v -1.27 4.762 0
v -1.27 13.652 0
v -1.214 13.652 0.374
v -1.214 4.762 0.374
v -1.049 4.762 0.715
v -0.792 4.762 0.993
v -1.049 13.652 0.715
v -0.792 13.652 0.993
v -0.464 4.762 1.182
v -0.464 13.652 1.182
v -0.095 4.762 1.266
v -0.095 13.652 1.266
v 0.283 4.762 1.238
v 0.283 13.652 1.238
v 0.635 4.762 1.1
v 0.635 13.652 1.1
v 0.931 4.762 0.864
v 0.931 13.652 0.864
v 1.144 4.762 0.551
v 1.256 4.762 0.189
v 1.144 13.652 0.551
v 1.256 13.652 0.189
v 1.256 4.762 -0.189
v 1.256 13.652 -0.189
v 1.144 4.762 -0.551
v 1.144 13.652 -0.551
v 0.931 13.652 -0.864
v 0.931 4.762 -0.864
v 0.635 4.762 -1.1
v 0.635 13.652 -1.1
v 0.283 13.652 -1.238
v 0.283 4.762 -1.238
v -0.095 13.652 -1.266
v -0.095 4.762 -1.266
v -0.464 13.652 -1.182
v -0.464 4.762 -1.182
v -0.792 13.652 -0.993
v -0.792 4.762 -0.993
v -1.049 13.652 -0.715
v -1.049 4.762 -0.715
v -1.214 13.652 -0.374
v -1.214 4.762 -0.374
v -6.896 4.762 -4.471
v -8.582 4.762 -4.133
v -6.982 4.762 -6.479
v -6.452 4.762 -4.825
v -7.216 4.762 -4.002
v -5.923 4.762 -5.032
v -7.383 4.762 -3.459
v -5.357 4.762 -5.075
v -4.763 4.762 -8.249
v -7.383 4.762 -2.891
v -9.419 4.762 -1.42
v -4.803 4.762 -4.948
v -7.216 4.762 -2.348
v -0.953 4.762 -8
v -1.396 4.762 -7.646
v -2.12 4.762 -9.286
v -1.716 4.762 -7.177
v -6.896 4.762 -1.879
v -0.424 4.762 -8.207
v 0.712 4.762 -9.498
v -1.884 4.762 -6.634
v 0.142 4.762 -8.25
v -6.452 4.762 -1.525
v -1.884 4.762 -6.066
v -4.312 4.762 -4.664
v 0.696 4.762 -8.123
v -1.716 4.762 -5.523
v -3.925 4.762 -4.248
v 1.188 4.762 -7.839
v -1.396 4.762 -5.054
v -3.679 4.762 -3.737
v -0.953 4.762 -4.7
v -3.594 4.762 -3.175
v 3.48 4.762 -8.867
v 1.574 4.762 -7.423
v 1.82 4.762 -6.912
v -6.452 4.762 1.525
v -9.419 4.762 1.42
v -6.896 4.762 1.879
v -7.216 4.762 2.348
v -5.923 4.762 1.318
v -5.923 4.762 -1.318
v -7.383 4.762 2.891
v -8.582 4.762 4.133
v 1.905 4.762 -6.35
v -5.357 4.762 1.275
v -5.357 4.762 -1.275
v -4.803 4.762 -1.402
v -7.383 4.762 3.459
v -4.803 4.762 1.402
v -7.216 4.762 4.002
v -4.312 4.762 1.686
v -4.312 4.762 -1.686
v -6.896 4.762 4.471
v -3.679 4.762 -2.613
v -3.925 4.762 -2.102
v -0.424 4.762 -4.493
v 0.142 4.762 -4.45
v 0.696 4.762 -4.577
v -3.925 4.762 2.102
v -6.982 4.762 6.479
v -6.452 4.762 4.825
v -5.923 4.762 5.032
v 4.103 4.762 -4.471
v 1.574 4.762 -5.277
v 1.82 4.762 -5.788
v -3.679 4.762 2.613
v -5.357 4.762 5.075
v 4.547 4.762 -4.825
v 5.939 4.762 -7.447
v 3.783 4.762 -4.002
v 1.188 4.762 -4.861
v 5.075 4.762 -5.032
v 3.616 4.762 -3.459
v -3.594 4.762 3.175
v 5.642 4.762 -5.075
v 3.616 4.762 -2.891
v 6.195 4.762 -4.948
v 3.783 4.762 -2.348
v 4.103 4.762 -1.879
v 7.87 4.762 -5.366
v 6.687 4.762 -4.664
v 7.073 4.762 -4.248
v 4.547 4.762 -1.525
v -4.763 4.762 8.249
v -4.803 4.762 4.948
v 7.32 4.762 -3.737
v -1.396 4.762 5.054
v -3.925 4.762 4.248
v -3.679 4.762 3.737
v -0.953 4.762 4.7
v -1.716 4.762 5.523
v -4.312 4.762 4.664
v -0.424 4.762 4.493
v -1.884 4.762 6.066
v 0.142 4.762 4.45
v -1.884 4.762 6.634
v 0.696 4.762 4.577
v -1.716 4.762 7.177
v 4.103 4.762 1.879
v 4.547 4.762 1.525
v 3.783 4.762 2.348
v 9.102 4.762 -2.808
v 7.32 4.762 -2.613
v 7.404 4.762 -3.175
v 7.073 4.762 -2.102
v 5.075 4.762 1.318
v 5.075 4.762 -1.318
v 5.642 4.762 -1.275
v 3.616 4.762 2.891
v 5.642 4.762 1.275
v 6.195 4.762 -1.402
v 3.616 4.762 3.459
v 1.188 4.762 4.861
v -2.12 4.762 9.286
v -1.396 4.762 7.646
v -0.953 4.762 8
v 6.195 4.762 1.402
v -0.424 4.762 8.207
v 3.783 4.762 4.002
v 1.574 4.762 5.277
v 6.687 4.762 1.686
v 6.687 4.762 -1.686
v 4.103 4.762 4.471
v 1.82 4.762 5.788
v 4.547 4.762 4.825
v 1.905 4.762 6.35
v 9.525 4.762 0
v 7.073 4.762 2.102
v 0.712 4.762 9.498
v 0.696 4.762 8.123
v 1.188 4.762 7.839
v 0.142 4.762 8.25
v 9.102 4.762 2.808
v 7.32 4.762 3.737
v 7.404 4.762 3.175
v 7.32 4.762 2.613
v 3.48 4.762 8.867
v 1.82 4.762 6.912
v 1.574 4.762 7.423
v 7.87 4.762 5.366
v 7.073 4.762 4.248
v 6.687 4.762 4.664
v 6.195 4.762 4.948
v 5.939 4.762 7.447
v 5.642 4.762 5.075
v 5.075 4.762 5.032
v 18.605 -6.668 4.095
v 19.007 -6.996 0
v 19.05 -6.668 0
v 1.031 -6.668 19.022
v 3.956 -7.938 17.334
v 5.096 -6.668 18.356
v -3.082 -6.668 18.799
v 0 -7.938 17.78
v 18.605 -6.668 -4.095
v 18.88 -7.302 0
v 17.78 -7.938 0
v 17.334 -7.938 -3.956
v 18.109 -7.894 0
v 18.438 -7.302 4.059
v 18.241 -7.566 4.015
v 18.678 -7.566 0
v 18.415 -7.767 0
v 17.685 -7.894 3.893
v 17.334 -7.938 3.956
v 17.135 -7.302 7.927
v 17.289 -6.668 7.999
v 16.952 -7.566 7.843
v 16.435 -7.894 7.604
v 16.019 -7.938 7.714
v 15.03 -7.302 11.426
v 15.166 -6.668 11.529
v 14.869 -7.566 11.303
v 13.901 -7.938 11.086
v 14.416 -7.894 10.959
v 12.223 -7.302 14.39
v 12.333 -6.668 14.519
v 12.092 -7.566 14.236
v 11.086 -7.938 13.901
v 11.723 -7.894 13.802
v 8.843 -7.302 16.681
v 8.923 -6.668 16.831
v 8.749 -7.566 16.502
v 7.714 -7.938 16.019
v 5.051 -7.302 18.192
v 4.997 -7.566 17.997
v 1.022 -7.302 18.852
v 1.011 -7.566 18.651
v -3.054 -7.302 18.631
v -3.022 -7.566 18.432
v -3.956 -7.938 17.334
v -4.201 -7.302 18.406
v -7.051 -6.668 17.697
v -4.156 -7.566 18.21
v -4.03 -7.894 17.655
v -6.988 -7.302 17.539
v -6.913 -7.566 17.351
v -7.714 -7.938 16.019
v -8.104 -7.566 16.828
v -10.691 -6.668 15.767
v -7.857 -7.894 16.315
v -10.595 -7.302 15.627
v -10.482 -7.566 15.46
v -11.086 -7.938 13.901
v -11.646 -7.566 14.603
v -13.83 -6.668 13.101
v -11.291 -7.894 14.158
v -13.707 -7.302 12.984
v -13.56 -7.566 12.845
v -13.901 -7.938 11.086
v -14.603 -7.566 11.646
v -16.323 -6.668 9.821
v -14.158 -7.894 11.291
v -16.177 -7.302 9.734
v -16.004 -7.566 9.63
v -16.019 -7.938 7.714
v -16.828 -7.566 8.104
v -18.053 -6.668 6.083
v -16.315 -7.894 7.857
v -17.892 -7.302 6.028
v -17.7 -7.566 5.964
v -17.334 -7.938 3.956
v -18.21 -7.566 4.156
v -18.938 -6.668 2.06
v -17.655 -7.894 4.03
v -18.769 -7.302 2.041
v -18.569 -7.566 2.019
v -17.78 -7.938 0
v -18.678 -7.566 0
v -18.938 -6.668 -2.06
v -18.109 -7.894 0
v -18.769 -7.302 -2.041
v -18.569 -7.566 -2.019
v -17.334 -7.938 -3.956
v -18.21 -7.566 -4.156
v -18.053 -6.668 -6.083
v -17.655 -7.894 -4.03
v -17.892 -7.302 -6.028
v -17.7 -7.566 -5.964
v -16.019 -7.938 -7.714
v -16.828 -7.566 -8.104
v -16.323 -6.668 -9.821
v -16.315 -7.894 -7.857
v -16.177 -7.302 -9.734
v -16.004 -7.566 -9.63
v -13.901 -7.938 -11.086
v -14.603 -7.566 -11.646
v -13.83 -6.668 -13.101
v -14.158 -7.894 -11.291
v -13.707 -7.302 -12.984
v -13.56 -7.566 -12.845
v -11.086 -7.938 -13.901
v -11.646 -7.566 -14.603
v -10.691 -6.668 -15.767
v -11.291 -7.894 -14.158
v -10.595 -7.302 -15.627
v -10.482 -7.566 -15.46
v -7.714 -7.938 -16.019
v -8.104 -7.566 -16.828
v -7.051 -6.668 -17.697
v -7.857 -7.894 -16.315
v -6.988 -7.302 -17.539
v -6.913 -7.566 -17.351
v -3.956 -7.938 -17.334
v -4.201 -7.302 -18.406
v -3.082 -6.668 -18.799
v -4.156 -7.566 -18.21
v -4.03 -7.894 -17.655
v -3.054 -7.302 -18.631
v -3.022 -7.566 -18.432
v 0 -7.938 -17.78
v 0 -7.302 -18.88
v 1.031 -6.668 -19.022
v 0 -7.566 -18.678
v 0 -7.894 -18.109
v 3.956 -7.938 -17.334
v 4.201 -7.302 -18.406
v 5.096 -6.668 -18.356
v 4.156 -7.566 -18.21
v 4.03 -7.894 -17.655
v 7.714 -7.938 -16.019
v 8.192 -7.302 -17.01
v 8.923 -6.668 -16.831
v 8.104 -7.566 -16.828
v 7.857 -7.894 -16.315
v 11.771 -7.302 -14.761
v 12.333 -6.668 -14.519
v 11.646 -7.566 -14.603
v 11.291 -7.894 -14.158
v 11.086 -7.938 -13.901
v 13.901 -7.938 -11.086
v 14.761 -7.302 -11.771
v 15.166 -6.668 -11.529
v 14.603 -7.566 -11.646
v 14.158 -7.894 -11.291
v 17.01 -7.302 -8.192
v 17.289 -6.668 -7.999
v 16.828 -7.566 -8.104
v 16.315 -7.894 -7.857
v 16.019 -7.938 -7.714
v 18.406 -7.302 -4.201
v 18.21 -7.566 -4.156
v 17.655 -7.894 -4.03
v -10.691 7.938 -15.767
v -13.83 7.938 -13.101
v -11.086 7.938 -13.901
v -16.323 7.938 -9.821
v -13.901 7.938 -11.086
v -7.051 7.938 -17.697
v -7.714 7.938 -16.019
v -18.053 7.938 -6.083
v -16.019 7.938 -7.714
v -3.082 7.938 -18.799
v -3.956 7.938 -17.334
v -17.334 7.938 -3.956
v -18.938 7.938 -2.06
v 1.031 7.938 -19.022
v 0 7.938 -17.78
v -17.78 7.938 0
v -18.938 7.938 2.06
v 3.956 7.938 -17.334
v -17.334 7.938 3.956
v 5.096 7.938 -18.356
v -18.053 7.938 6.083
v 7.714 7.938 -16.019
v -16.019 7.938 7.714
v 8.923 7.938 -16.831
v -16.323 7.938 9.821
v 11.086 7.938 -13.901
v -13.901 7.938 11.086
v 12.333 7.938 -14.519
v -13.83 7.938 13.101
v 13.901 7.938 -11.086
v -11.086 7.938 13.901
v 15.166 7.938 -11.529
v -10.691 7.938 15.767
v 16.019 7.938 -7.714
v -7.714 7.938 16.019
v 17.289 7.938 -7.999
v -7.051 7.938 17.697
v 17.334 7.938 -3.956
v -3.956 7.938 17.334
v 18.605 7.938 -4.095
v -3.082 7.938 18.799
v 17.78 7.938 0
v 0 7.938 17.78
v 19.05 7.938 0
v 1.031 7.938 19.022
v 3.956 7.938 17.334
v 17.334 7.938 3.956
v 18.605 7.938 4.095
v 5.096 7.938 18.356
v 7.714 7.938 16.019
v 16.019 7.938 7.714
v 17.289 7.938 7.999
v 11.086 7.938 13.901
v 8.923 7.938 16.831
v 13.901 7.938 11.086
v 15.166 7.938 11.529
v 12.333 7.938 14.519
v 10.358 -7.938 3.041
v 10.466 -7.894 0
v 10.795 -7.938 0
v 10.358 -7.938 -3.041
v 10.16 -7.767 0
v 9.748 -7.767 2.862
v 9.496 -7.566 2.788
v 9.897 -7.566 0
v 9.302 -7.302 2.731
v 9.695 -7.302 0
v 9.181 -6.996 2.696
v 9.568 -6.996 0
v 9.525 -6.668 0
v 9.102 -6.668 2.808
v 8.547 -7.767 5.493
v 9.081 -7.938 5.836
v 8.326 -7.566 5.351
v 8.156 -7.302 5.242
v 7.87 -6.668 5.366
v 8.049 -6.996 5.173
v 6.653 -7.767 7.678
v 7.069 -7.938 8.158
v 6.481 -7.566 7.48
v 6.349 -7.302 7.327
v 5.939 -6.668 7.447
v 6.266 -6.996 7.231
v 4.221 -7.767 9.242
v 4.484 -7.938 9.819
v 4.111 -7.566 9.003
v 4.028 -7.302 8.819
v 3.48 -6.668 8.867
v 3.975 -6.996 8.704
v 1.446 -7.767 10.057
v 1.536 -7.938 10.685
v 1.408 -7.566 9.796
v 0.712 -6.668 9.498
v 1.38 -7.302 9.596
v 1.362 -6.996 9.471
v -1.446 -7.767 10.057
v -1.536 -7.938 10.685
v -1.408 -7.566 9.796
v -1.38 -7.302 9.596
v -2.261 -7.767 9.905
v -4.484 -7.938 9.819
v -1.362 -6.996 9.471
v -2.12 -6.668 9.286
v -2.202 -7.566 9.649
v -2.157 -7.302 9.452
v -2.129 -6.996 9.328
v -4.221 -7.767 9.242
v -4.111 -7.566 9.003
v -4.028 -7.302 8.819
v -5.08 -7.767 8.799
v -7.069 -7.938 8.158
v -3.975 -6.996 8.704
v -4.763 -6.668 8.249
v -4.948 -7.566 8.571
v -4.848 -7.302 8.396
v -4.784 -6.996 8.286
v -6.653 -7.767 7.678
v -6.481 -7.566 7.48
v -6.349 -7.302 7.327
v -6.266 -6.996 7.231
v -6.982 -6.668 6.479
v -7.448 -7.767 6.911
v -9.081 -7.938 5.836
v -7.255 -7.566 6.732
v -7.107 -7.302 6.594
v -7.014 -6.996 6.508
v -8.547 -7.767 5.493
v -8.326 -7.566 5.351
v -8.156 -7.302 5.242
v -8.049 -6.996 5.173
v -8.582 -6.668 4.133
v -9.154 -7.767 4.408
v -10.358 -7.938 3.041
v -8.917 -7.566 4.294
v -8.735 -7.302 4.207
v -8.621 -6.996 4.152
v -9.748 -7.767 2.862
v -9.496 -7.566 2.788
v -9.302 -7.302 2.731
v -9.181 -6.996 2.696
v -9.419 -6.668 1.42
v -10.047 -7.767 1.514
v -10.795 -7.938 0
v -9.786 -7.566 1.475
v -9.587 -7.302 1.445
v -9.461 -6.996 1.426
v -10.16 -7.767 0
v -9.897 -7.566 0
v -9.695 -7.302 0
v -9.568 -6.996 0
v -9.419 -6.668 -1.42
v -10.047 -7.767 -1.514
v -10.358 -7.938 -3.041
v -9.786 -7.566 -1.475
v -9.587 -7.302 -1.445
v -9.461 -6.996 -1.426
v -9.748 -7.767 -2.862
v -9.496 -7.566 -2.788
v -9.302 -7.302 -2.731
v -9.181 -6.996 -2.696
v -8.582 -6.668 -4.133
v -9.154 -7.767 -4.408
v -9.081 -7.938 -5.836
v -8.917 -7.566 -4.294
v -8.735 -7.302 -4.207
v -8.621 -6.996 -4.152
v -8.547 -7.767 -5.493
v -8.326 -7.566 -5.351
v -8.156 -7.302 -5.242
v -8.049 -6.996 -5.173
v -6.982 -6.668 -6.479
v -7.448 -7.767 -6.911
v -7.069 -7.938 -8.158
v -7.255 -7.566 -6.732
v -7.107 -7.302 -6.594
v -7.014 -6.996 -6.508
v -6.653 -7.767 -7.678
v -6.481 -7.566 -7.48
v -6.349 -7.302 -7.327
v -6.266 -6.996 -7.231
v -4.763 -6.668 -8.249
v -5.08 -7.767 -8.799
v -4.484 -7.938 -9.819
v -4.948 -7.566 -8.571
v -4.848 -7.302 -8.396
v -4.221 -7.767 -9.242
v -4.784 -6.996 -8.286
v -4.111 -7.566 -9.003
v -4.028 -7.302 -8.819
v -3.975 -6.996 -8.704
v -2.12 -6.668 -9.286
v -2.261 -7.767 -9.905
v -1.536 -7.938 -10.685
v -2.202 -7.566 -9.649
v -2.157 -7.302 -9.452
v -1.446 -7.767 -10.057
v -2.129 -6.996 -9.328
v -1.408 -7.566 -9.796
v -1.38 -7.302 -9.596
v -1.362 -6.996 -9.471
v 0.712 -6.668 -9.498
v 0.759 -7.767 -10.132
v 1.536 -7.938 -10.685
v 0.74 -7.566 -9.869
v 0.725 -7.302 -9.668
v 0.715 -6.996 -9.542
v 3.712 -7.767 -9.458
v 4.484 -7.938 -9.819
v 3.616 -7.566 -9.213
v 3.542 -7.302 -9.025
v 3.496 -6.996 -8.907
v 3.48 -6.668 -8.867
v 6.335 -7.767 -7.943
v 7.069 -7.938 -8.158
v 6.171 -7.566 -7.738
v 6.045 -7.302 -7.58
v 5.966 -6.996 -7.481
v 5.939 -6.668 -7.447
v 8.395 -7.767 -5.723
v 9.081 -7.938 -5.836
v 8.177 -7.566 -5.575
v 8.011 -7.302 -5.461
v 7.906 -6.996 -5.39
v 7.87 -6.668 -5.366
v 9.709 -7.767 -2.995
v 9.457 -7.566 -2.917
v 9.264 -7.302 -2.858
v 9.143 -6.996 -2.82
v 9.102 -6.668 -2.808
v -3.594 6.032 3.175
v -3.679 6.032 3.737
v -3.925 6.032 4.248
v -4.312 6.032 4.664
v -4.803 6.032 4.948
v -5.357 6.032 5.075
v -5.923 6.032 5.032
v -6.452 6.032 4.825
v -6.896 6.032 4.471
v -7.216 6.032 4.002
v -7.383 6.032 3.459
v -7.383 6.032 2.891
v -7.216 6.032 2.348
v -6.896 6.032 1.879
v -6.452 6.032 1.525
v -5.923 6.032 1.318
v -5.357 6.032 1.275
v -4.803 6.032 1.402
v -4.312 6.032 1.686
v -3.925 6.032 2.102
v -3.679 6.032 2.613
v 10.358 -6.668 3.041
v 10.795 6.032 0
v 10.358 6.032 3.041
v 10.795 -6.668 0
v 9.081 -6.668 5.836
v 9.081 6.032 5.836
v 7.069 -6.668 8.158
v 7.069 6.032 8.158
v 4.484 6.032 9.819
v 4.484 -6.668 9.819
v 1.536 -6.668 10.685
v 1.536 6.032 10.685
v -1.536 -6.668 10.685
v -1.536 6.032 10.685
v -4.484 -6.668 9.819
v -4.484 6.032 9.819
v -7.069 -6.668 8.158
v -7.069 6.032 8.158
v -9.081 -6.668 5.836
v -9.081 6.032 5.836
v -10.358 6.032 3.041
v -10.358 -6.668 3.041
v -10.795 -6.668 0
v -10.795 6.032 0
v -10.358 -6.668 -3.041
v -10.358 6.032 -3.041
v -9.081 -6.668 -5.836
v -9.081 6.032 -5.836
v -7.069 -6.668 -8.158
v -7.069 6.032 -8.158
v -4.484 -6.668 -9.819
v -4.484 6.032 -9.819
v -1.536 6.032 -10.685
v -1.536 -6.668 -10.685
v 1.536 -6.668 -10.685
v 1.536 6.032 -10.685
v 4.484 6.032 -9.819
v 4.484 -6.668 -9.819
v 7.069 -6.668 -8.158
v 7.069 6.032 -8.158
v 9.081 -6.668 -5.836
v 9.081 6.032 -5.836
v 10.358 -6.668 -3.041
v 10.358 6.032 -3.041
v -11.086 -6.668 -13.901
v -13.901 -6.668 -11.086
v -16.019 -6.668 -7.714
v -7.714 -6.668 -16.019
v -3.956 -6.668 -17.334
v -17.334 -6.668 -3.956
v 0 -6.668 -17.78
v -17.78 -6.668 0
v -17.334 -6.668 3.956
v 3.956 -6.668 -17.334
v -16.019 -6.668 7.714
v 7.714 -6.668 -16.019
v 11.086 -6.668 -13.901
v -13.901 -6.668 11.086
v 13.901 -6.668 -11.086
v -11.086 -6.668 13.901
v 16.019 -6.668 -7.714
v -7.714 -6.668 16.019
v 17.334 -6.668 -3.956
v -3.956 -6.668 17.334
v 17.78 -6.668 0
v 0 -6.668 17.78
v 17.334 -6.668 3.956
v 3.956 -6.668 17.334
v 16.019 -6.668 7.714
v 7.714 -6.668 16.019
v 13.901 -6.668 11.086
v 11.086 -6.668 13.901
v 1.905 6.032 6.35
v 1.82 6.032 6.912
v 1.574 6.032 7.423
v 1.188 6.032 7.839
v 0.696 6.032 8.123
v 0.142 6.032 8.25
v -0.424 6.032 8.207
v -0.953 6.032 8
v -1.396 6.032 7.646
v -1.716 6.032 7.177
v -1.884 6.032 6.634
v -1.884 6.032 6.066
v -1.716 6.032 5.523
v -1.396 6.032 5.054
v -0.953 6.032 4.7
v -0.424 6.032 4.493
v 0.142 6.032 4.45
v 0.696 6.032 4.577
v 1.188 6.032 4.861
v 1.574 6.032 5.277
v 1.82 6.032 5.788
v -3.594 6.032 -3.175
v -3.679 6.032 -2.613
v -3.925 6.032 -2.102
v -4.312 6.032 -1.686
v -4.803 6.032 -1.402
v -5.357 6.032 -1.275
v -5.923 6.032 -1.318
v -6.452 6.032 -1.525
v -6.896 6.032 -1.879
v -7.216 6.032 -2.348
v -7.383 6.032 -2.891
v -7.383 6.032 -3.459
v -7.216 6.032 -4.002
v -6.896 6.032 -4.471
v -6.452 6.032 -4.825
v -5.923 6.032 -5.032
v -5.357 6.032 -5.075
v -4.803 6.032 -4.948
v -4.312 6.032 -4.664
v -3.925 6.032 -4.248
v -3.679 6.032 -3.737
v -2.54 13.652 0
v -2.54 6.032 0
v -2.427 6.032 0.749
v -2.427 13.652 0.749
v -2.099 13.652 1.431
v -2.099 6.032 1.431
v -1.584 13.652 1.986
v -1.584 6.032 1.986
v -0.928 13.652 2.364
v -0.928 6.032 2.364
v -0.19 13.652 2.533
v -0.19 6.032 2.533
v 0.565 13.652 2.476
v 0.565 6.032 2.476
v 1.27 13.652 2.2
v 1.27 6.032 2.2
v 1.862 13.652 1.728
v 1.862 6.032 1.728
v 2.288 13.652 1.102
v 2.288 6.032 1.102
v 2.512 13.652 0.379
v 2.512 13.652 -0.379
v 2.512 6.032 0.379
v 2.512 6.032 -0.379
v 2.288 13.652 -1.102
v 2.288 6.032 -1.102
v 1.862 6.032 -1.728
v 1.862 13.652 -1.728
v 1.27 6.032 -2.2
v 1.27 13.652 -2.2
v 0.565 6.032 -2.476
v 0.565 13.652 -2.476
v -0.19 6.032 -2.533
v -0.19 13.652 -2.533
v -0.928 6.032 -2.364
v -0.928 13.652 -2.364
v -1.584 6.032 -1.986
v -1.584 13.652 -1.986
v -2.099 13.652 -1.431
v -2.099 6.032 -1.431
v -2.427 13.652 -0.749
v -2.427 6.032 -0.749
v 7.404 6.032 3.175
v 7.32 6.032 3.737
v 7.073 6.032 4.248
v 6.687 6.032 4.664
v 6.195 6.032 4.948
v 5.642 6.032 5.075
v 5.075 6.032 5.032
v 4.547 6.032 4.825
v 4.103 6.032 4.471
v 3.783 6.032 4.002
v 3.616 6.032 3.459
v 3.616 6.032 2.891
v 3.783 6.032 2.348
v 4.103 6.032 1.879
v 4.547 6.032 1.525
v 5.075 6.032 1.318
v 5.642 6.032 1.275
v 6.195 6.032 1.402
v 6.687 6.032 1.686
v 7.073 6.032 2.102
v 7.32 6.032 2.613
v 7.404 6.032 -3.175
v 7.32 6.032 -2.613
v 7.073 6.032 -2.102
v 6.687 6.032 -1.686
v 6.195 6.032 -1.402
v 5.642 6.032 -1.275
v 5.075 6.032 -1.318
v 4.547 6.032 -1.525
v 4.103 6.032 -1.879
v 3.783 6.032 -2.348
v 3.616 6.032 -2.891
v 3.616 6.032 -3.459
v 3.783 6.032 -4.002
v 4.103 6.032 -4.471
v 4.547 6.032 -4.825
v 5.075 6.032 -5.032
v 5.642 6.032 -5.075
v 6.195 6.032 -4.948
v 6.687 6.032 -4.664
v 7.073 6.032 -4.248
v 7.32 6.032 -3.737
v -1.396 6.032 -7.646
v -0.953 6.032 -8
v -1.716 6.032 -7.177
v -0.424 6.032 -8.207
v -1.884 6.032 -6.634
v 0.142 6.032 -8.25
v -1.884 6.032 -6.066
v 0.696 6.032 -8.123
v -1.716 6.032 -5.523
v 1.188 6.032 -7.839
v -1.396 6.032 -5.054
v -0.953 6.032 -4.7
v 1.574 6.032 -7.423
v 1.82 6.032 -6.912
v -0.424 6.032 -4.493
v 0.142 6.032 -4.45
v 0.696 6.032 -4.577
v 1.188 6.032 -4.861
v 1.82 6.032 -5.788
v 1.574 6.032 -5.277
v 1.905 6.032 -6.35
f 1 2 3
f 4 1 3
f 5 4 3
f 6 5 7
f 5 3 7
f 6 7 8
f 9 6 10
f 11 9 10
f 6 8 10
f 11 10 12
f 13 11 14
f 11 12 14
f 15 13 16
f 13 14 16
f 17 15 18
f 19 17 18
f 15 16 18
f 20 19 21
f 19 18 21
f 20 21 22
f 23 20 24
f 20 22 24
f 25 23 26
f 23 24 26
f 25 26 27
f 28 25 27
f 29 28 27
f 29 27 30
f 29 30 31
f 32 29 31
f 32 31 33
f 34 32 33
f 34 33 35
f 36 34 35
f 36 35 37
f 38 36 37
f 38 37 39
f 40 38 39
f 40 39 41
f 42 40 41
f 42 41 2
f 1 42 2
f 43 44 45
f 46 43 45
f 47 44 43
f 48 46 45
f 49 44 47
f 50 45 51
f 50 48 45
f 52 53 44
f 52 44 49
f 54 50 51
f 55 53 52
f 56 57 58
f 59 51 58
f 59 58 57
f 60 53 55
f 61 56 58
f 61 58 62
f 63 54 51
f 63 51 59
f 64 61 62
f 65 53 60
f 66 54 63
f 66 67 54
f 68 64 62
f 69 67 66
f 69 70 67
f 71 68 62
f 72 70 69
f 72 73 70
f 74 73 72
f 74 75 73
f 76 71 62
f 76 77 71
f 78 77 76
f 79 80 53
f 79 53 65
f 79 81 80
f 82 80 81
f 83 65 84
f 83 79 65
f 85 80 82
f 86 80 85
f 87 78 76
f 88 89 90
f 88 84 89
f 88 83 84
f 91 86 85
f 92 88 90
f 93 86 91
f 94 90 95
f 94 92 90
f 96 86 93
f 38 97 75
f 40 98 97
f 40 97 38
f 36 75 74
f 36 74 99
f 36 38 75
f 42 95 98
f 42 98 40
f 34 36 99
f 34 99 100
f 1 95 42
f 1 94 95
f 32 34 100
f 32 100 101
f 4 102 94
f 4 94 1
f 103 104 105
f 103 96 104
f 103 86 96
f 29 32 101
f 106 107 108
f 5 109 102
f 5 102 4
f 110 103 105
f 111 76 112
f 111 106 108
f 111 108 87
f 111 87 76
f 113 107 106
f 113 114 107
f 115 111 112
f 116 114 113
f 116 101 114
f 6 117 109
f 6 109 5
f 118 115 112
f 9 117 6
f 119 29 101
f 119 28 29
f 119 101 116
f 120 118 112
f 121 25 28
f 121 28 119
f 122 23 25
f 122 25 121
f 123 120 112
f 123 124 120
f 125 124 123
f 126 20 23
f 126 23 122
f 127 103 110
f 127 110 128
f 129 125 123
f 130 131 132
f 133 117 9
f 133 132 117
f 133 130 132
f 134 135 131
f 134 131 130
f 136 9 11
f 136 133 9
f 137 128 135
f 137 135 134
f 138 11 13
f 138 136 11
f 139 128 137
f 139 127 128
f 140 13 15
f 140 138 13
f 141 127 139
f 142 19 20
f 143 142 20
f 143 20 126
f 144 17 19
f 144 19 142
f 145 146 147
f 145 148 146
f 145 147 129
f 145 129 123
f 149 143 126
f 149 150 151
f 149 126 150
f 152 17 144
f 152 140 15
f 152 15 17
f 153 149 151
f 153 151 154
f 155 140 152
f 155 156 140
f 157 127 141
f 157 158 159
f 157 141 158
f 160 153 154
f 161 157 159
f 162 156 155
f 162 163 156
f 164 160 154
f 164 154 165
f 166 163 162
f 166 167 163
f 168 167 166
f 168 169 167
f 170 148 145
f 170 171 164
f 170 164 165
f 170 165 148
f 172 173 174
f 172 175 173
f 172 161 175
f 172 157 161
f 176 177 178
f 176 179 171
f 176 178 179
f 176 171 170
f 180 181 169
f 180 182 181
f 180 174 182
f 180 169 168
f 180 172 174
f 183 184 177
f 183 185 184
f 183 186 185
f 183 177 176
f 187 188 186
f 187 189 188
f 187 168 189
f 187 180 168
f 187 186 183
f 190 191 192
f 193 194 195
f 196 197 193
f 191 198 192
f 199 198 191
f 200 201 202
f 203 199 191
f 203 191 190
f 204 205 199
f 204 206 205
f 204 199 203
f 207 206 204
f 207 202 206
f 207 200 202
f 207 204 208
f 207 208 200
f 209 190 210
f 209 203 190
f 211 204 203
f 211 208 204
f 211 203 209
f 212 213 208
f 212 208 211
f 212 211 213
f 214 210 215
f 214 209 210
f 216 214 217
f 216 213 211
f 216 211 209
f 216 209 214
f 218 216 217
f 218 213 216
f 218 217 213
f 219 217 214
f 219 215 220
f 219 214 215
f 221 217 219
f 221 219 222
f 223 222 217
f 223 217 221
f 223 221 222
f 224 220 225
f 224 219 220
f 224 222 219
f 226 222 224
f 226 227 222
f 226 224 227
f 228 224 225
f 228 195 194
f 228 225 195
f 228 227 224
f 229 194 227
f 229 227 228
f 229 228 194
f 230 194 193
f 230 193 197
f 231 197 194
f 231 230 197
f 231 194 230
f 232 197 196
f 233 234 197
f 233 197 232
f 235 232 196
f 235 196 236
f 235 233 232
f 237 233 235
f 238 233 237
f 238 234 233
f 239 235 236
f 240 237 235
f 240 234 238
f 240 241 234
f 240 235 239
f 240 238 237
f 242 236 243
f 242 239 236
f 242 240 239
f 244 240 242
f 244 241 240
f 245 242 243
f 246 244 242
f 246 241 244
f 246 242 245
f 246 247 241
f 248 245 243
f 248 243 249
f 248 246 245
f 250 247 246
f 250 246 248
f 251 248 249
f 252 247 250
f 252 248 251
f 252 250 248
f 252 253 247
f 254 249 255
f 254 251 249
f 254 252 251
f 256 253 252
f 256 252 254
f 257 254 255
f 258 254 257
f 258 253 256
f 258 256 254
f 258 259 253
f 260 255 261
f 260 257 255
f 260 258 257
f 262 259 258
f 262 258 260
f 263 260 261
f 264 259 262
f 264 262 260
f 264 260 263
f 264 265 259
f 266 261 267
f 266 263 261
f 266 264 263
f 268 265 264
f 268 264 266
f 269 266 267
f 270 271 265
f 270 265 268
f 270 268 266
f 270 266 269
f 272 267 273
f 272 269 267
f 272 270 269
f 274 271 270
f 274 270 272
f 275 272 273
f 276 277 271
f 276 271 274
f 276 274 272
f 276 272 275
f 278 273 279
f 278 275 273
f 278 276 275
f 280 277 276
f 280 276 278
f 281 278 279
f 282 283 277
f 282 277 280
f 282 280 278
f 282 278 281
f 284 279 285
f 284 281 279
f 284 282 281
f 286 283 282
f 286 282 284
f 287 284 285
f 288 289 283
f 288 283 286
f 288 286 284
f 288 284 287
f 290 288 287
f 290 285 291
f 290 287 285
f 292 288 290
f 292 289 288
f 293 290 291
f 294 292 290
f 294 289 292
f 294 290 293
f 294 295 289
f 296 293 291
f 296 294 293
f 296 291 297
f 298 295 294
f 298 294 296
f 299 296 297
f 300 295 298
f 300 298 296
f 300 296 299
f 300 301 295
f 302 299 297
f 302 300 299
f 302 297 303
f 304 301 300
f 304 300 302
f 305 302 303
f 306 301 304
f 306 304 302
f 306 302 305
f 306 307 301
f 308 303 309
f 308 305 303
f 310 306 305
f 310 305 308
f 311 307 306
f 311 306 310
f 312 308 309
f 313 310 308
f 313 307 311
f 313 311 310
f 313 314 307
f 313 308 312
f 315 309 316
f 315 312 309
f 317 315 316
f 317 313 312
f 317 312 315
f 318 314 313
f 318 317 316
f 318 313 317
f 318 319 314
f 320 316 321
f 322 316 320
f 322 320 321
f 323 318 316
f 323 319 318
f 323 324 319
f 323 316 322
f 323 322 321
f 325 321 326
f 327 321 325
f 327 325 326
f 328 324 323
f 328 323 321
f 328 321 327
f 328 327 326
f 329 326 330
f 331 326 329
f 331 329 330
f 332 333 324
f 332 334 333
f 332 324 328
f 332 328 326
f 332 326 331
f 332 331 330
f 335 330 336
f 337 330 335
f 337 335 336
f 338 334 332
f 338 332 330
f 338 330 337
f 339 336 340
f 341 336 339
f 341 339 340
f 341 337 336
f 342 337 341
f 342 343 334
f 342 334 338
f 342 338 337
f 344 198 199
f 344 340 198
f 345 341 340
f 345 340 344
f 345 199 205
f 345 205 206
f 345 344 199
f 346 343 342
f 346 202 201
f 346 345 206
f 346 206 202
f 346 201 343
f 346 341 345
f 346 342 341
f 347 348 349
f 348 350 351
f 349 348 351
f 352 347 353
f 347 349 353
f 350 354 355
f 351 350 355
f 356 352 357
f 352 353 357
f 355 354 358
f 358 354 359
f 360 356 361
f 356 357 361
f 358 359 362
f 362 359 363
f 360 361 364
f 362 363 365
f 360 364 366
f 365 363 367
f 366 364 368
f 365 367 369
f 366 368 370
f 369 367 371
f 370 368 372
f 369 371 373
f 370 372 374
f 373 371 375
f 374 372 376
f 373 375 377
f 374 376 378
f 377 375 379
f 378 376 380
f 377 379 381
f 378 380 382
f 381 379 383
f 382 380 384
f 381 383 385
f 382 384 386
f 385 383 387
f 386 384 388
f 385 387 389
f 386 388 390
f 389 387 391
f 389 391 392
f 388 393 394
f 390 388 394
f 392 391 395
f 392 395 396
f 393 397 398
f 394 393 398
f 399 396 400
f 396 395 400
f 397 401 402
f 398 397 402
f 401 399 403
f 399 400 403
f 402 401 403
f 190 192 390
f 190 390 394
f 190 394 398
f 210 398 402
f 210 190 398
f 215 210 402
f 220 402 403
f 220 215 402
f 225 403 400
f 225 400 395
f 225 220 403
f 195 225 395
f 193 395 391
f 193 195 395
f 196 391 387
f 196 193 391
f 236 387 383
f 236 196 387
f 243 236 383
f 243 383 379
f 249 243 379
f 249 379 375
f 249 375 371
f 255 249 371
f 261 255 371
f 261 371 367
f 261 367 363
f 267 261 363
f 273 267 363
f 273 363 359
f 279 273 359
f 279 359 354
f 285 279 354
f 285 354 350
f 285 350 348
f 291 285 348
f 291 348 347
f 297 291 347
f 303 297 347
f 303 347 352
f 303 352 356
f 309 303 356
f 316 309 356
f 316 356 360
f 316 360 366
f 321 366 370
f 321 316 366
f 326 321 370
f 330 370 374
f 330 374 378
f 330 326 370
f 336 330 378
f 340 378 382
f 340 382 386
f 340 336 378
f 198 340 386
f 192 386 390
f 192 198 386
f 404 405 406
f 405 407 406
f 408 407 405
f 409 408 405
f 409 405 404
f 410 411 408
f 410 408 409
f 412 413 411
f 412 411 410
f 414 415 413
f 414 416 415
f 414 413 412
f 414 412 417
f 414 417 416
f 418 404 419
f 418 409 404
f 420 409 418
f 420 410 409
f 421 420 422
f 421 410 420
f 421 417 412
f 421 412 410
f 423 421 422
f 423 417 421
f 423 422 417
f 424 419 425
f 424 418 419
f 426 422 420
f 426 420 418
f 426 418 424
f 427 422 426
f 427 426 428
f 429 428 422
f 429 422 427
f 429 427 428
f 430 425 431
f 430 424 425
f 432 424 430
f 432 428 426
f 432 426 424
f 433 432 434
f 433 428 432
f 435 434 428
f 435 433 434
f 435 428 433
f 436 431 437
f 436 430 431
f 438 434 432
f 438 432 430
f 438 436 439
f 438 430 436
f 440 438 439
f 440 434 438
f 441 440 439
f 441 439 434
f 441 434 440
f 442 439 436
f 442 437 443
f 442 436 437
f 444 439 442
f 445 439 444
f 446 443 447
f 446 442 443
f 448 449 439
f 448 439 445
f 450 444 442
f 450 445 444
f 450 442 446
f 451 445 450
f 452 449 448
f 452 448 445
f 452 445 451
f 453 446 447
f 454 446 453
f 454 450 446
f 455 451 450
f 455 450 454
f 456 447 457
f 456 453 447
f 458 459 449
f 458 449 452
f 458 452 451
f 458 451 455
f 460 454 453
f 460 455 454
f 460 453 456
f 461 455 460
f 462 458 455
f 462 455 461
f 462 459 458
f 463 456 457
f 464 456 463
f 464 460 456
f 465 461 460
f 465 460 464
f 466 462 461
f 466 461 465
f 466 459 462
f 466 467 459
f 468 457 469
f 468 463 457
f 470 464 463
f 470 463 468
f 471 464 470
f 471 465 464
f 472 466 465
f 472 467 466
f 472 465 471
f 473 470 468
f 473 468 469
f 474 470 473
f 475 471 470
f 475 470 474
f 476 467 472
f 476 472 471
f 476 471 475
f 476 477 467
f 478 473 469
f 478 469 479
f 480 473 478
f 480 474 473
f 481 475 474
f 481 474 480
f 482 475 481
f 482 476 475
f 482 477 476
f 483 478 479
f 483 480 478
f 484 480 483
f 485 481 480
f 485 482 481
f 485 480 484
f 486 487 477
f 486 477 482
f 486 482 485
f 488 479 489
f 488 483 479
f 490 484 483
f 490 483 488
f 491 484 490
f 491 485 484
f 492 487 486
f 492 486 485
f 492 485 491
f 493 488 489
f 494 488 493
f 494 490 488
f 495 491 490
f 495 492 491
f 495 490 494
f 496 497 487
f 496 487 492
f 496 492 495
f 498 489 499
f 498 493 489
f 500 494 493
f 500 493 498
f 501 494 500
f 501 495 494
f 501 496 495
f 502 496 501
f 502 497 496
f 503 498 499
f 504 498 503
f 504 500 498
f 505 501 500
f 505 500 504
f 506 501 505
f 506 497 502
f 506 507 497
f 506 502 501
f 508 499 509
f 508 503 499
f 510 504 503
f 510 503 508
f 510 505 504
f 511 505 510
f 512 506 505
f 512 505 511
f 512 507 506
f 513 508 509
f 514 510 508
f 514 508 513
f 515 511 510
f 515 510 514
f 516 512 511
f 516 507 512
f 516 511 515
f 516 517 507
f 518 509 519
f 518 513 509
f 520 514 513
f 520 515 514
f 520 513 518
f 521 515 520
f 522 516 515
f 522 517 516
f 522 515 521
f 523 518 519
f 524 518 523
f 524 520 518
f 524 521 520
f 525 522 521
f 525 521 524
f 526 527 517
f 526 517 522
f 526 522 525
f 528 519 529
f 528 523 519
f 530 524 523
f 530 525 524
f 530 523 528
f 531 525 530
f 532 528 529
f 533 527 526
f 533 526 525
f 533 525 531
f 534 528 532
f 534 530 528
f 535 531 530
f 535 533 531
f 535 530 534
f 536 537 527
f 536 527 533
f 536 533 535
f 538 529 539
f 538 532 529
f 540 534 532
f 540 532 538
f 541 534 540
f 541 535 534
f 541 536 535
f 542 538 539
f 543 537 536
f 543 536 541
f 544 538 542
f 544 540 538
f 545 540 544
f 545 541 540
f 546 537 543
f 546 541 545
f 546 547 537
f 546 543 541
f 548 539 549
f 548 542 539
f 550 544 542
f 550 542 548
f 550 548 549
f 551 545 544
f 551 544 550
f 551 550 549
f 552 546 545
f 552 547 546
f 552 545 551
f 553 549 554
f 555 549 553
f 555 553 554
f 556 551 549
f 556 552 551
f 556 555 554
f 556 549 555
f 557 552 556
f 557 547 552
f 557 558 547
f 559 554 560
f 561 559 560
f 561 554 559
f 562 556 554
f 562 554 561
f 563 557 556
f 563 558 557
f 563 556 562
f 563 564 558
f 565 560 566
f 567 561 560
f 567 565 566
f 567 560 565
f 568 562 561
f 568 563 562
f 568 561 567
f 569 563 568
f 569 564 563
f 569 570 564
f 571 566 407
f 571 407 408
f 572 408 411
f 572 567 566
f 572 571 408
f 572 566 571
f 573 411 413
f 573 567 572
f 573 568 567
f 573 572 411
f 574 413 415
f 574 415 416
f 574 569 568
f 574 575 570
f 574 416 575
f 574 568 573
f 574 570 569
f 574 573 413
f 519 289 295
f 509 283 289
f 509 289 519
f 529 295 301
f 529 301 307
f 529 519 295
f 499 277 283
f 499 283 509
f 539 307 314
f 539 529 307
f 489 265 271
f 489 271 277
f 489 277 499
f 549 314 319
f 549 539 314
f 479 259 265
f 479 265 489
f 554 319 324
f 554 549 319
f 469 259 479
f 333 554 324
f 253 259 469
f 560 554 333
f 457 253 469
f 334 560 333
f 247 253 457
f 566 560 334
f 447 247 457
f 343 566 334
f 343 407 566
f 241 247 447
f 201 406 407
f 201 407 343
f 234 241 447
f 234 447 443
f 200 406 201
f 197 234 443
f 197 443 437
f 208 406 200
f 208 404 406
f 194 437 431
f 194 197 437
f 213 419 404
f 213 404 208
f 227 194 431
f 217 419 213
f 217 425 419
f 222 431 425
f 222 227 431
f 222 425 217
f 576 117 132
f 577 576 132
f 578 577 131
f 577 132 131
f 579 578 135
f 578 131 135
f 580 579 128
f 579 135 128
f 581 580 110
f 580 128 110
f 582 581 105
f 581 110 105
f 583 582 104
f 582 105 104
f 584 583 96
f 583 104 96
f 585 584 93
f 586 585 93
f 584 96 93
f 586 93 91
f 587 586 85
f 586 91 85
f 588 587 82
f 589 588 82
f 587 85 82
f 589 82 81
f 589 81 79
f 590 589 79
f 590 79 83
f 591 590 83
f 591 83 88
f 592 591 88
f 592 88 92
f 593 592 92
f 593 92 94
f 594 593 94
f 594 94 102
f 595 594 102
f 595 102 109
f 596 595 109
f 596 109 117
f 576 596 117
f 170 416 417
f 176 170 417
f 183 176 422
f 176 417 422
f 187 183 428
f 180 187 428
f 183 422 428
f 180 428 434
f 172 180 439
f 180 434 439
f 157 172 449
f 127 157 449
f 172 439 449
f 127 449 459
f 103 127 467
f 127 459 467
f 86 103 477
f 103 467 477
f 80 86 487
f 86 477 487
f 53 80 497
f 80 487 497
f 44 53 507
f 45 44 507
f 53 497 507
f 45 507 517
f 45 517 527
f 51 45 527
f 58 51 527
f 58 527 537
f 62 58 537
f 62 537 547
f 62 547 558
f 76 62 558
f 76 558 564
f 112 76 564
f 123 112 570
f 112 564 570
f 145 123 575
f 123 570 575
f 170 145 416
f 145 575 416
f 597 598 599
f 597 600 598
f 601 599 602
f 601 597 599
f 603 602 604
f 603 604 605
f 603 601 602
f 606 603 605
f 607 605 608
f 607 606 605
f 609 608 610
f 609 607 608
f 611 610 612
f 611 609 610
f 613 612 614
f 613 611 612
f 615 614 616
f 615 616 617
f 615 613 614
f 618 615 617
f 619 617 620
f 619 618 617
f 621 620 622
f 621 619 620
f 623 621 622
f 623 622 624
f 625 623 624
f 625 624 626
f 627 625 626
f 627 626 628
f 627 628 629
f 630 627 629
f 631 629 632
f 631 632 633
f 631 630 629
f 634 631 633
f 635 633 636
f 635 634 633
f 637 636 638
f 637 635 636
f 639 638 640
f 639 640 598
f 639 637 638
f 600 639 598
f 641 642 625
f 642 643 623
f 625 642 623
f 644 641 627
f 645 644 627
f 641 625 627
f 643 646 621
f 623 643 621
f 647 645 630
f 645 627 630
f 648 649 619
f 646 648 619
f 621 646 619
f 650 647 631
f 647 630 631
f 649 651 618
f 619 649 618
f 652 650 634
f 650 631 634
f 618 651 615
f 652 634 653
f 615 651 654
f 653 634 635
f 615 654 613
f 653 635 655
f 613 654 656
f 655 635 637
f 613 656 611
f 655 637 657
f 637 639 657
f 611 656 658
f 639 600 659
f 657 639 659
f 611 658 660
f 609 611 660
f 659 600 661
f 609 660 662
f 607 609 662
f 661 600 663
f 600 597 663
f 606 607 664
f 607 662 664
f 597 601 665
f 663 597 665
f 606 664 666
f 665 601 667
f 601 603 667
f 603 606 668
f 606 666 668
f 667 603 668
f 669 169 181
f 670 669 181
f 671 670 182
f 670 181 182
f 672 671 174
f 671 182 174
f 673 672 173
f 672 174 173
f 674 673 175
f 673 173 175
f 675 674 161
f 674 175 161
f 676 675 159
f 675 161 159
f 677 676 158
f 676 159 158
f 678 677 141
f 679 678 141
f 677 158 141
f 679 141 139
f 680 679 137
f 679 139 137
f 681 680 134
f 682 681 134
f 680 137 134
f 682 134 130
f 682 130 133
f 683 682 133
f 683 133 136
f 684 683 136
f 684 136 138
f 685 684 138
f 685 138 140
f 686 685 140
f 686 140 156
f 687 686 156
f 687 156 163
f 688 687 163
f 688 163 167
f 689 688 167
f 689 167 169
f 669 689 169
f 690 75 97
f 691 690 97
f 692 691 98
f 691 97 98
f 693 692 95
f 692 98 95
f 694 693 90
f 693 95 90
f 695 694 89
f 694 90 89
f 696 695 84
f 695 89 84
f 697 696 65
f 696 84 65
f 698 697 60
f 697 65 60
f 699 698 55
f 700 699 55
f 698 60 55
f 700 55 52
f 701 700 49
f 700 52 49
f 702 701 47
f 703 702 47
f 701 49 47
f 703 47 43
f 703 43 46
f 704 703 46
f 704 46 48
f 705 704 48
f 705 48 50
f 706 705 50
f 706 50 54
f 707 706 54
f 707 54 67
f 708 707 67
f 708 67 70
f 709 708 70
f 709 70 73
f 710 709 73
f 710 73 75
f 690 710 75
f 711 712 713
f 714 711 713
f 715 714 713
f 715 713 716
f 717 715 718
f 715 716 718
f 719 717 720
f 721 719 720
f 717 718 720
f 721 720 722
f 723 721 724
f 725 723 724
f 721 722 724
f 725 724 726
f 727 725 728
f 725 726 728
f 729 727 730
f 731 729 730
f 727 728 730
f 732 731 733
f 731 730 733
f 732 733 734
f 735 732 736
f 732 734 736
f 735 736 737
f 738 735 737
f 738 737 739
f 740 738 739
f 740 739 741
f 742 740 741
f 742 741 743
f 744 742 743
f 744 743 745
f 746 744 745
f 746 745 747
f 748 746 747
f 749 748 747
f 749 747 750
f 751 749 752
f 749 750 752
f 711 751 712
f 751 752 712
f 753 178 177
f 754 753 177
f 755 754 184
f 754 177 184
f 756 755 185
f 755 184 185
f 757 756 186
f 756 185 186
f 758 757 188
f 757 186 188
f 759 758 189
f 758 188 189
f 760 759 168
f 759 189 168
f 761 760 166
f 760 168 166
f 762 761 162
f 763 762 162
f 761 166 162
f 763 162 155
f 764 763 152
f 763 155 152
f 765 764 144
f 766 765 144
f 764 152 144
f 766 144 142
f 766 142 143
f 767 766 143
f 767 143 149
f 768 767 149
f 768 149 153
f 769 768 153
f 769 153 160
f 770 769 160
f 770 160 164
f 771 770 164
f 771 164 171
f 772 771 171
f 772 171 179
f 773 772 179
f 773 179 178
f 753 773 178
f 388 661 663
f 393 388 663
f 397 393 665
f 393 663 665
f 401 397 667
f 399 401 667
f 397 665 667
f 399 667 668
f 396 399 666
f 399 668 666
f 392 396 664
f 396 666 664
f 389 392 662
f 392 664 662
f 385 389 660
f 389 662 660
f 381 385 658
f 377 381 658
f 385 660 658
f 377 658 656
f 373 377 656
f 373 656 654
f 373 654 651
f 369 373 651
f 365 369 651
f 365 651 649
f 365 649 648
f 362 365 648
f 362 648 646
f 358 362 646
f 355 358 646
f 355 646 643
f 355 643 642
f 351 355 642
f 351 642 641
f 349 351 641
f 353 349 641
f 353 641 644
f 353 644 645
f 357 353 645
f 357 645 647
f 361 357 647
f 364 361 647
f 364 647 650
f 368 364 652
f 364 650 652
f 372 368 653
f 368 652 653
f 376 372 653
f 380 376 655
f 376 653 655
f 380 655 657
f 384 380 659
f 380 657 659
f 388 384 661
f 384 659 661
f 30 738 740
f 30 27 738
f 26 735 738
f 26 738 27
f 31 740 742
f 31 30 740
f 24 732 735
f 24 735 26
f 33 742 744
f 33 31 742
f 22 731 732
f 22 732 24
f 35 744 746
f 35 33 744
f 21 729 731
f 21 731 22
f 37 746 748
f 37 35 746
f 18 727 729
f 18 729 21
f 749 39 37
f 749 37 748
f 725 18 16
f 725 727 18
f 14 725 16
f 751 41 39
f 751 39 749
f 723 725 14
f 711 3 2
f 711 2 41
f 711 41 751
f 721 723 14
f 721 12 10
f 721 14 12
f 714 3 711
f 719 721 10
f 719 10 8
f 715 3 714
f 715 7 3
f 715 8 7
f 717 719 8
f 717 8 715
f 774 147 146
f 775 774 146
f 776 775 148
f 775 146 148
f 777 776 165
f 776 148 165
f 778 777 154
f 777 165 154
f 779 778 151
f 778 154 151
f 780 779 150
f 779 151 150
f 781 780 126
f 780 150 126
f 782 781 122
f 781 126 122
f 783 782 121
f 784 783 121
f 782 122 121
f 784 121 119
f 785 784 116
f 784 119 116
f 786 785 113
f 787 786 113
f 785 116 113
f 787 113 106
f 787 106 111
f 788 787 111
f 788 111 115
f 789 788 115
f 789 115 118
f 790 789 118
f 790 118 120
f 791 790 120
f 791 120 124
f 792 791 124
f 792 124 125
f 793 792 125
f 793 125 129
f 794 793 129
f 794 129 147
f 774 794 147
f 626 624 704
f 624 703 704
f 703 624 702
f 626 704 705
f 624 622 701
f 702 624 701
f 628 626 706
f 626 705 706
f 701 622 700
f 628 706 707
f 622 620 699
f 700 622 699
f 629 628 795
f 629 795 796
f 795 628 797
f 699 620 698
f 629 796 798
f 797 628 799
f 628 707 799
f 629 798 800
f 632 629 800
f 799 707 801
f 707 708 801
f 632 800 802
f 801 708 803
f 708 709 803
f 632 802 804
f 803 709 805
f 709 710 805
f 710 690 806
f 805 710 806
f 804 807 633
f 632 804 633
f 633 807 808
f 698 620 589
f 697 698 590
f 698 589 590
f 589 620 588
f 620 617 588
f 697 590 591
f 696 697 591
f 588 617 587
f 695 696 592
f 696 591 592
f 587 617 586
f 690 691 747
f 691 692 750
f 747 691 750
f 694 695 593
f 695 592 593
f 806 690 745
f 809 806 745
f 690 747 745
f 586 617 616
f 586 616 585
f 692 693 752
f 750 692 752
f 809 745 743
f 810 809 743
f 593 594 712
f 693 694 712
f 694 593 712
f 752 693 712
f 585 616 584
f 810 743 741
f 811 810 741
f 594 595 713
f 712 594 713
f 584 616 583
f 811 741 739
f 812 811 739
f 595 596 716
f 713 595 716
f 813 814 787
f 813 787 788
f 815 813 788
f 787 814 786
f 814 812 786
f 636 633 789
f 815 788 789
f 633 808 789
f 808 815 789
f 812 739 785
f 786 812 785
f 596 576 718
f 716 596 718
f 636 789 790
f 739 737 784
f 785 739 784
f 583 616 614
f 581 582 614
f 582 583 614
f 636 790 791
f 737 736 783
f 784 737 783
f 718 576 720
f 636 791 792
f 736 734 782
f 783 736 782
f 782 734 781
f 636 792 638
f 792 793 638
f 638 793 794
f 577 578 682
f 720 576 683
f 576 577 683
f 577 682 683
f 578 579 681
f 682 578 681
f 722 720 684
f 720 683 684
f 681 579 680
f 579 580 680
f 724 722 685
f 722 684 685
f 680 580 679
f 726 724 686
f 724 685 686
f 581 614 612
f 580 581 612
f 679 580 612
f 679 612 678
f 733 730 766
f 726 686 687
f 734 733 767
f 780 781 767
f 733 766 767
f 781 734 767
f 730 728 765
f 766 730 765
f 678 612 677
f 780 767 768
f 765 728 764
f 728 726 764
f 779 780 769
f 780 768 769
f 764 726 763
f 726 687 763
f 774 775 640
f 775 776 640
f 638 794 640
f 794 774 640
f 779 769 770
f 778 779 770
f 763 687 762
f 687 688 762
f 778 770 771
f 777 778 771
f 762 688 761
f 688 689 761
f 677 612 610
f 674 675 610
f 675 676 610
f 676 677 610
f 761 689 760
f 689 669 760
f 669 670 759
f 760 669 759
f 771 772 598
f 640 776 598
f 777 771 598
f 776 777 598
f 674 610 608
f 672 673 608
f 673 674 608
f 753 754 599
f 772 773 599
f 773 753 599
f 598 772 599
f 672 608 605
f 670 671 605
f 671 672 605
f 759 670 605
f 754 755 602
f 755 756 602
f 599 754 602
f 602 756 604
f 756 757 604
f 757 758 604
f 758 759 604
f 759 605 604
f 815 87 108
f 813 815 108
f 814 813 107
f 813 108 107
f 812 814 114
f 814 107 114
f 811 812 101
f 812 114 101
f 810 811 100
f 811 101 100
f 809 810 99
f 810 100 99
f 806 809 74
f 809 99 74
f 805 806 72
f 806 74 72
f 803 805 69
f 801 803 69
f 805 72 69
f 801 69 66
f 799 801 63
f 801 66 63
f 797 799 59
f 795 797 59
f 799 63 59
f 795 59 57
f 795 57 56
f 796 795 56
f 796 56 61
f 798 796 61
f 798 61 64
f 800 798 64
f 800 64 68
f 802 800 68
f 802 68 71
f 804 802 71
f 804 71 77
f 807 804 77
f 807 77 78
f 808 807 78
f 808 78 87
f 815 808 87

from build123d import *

# Parameters (mm, degrees)
F0_R      = 19.05
F1_DEPTH  = 7.9375
F2_R      = 9.525
F3_DEPTH  = 12.7
F4_T      = -1.27
F5_R      = 1.905
F6_DEPTH  = 3.176
F7_R      = 2.54
F8_DEPTH  = 7.62
F9_R      = 1.27
F10_DEPTH = 21.591
F11_R     = 1.27


with BuildPart() as f1:
    # F0 (on Front) → F1 (new body, symmetric)
    with BuildSketch(Plane.XZ):
        Circle(F0_R)
    extrude(amount=F1_DEPTH, both=True)

    # F2 (on face) → F3 (cut)
    with BuildSketch(Plane.XZ.offset(7.9375)):
        Circle(F2_R)
    extrude(amount=-F3_DEPTH, mode=Mode.SUBTRACT)

    # F4
    f4_openings = [f1.faces().sort_by_distance(p)[0] for p in [
        (0, 7.9375, 0),
    ]]
    offset(amount=F4_T, openings=f4_openings, kind=Kind.INTERSECTION)

    # F5 (on face) → F6 (cut, through all)
    with BuildSketch(Plane.XZ.offset(-4.7625)):
        with Locations((0, 6.35)):
            Circle(F5_R)
        with Locations((-5.499261314, 3.175)):
            Circle(F5_R)
        with Locations((-5.499261314, -3.175)):
            Circle(F5_R)
        with Locations((0, -6.35)):
            Circle(F5_R)
        with Locations((5.499261314, -3.175)):
            Circle(F5_R)
        with Locations((5.499261314, 3.175)):
            Circle(F5_R)
    extrude(amount=-F6_DEPTH, mode=Mode.SUBTRACT)

    # F7 (on face) → F8 (join)
    with BuildSketch(Plane(origin=(0, 6.0325, 0), x_dir=(-1, 0, 0), z_dir=(0, 1, 0))):
        Circle(F7_R)
    extrude(amount=F8_DEPTH)

    # F9 (on face) → F10 (cut, through all)
    with BuildSketch(Plane(origin=(0, 13.6525, 0), x_dir=(-1, 0, 0), z_dir=(0, 1, 0))):
        Circle(F9_R)
    extrude(amount=-F10_DEPTH, mode=Mode.SUBTRACT)

    # F11
    f11_edges = [f1.edges().sort_by_distance(p)[0] for p in [
        (-19.05, -7.9375, 0),
        (-9.525, -7.9375, 0),
    ]]
    fillet(f11_edges, radius=F11_R)


solid = f1.part
